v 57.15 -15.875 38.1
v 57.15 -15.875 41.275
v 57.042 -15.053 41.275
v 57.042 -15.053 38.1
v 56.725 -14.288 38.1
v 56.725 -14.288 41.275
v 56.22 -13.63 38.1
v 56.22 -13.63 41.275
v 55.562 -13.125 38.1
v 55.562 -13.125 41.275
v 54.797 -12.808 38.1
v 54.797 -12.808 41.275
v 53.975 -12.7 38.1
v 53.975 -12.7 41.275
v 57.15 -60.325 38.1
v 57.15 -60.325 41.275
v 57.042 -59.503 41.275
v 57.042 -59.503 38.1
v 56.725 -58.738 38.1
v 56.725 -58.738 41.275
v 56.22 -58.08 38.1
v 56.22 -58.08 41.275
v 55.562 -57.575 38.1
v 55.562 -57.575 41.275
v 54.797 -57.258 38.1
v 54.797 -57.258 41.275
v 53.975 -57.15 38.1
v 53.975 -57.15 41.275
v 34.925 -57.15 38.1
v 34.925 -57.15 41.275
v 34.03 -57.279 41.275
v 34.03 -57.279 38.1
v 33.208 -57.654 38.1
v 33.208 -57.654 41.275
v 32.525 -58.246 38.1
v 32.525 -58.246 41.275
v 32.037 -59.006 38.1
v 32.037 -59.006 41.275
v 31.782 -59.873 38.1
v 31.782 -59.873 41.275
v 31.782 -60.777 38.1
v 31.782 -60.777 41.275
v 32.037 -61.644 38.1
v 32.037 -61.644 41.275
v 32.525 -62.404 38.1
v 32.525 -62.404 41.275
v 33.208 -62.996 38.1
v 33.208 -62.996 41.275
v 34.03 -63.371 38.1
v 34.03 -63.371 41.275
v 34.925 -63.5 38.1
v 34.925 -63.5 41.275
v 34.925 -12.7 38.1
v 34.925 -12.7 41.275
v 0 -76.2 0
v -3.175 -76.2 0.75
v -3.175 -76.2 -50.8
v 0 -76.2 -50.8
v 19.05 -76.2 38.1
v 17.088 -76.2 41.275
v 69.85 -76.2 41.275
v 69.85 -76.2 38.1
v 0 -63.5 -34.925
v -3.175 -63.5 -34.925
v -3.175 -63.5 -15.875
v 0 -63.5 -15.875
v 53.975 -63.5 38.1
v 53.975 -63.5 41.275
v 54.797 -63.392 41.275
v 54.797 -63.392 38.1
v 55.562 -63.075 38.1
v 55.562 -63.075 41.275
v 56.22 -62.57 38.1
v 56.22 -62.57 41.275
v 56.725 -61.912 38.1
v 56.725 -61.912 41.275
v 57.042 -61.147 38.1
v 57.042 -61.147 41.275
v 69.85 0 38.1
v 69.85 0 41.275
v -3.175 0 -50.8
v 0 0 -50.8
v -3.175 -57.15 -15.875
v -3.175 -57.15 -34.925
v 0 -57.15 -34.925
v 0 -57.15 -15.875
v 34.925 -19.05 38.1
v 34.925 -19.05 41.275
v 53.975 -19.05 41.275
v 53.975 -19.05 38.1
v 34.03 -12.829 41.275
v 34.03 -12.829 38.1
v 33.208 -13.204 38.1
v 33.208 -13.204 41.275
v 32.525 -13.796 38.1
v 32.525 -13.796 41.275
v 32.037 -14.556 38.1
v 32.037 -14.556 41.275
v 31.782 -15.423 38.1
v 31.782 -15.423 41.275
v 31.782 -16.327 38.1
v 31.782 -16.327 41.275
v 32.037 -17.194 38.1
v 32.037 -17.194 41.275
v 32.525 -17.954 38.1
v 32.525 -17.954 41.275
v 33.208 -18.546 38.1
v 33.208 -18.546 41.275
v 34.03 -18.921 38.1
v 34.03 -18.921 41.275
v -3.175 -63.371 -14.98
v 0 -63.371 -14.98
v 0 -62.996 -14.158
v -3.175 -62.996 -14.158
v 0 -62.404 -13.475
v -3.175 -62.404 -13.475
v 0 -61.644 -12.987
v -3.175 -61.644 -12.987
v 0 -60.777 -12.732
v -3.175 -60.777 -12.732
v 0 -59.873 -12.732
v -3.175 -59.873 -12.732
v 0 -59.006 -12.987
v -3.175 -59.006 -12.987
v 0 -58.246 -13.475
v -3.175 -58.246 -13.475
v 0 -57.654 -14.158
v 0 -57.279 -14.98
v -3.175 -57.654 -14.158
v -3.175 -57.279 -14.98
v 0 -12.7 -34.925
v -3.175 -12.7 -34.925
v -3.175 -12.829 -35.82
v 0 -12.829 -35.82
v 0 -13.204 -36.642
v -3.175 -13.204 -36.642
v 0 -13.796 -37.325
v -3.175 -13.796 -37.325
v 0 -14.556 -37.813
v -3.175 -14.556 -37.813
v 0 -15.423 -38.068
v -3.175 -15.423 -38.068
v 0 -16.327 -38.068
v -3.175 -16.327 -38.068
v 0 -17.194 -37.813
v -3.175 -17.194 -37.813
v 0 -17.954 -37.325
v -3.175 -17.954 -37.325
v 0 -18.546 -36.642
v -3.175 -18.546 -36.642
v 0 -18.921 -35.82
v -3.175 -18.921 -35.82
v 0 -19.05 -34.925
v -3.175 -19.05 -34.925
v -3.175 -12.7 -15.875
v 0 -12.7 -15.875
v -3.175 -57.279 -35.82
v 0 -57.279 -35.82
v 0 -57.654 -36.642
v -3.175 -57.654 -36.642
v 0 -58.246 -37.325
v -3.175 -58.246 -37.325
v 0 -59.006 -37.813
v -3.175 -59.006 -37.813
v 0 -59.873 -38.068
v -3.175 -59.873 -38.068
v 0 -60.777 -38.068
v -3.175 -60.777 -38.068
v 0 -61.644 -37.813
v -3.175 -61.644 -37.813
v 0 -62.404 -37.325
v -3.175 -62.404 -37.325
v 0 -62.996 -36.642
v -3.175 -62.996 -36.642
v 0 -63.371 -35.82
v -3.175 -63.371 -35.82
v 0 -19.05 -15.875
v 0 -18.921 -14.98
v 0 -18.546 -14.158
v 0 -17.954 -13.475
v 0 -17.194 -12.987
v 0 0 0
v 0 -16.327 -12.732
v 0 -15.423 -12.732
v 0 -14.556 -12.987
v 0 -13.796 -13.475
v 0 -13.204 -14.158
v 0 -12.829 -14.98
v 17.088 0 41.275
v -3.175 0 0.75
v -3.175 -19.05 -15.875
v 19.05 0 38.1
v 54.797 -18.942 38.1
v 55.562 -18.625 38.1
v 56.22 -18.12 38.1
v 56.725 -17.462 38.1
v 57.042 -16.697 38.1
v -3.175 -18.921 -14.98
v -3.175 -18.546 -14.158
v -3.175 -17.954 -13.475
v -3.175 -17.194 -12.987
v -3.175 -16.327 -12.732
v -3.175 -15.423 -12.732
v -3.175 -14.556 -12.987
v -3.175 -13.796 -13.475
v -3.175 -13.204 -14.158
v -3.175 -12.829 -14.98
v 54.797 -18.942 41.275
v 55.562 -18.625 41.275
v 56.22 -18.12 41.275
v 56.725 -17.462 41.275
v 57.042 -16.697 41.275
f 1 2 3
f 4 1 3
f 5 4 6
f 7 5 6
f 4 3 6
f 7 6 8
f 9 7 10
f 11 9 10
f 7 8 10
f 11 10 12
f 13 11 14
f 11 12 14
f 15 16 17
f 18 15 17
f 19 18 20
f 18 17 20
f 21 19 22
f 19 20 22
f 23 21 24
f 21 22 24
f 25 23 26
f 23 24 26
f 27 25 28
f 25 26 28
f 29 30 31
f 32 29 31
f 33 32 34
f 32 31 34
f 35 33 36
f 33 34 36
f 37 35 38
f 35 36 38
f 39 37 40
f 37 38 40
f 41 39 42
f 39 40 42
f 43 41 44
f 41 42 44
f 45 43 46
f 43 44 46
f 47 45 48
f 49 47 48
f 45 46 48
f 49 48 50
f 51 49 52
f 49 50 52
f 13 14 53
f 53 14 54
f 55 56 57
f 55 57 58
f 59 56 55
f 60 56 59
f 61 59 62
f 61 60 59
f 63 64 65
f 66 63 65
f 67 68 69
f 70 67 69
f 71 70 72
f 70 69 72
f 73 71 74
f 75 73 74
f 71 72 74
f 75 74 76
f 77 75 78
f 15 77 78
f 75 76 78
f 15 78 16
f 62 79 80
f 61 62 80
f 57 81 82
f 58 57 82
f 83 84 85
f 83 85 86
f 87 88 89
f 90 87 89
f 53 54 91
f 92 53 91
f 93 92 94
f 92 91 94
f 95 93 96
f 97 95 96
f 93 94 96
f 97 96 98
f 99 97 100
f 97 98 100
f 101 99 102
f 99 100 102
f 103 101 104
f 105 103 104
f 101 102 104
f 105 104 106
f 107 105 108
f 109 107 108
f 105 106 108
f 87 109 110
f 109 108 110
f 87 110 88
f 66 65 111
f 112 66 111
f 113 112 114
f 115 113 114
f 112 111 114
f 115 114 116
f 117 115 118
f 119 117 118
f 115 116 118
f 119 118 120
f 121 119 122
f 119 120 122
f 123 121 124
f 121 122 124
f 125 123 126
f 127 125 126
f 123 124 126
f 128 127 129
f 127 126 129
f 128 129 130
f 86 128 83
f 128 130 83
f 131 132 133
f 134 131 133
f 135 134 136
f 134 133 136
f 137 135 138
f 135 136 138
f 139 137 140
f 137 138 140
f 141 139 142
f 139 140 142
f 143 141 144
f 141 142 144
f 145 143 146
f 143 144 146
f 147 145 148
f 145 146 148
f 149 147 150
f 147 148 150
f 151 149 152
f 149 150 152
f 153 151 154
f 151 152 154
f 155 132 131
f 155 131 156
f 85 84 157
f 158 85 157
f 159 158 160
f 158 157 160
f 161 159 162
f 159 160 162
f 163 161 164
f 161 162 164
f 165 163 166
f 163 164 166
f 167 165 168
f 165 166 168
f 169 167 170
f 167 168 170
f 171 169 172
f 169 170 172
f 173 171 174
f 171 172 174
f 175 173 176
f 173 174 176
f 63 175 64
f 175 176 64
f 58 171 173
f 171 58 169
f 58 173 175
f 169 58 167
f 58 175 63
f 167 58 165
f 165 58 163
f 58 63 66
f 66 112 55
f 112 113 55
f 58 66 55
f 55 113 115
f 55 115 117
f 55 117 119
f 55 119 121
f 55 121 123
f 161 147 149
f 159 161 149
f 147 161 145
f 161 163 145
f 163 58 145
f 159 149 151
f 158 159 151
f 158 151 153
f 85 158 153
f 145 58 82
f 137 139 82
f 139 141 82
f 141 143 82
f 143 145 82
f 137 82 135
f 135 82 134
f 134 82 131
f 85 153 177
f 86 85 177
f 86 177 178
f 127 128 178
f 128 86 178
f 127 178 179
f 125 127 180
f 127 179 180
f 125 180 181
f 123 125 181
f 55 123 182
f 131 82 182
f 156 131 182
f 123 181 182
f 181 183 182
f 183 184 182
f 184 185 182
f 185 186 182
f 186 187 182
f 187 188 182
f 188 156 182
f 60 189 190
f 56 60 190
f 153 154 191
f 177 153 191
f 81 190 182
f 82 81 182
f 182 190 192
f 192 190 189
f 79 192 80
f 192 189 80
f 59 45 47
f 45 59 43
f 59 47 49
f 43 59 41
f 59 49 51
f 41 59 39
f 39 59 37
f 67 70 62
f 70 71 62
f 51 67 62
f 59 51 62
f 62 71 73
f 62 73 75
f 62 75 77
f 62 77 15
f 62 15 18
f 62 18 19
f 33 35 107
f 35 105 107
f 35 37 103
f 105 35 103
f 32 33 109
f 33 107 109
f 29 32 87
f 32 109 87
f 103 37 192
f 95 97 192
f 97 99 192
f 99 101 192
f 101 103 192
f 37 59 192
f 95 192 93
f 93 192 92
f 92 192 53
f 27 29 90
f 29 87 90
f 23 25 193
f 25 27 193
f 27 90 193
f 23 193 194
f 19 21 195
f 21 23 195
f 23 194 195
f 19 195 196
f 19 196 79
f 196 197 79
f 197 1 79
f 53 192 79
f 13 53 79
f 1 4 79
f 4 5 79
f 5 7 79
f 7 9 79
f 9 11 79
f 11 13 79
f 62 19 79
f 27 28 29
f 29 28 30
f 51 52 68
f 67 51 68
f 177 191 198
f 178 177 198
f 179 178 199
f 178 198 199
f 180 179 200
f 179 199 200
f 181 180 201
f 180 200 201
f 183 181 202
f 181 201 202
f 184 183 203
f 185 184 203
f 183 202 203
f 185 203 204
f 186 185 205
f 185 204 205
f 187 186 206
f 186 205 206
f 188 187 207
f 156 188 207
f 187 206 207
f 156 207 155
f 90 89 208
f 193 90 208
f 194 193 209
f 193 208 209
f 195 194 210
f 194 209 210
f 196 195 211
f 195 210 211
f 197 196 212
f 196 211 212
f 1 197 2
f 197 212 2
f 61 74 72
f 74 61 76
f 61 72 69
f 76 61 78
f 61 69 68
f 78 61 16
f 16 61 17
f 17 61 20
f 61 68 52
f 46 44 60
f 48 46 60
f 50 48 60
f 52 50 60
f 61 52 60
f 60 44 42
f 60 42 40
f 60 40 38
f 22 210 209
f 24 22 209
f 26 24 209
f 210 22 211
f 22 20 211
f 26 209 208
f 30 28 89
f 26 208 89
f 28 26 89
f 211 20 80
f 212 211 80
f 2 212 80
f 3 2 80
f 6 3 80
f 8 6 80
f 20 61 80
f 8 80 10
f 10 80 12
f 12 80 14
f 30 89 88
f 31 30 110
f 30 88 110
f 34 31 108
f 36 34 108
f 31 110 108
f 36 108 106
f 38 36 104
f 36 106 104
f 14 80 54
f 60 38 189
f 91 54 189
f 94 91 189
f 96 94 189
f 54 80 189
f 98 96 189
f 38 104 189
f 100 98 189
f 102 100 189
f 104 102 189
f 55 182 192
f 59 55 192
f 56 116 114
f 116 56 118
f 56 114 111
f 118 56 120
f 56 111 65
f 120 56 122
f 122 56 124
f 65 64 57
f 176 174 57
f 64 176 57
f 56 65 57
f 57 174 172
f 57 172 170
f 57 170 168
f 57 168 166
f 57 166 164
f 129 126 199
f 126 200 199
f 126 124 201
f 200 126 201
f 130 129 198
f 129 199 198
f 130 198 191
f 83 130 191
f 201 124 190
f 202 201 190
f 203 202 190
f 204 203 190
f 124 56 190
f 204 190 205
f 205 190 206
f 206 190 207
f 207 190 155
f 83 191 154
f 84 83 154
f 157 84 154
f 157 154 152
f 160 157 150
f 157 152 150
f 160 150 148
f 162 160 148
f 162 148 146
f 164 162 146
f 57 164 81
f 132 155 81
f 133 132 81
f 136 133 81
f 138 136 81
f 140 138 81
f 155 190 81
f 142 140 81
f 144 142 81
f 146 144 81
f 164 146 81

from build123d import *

# Parameters (mm, degrees)
F1_DEPTH = 76.2
F3_DEPTH = 92.076
F4_DEPTH = 92.076
F5_W     = 6.35
F5_H     = 19.05
F6_DEPTH = 73.026
F7_W     = 6.35
F7_H     = 19.05
F8_DEPTH = 73.026


with BuildPart() as f1:
    # F0 (on Front) → F1 (new body)
    with BuildSketch(Plane.XZ):
        Polygon((0, -50.8), (0, 0), (19.05, 38.1), (69.85, 38.1), (69.85, 41.275), (17.087742, 41.275), (-3.175, 0.749516), (-3.175, -50.8), align=None)
    extrude(amount=F1_DEPTH)

    # F2 (on face) → F3 (cut, through all)
    with BuildSketch(Plane.XY.offset(41.275)):
        with BuildLine():
            ThreePointArc((53.975, -19.05), (56.220064, -18.120064), (57.15, -15.875))
            ThreePointArc((57.15, -15.875), (56.220064, -13.629936), (53.975, -12.7))
            ThreePointArc((53.975, -12.7), (50.8, -15.875), (53.975, -19.05))
        make_face()
        with BuildLine():
            ThreePointArc((53.975, -19.05), (50.8, -15.875), (53.975, -12.7))
            Line((53.975, -12.7), (34.925, -12.7))
            ThreePointArc((34.925, -12.7), (37.170064, -13.629936), (38.1, -15.875))
            ThreePointArc((38.1, -15.875), (37.170064, -18.120064), (34.925, -19.05))
            Line((34.925, -19.05), (53.975, -19.05))
        make_face()
        with BuildLine():
            ThreePointArc((38.1, -15.875), (37.170064, -13.629936), (34.925, -12.7))
            ThreePointArc((34.925, -12.7), (31.75, -15.875), (34.925, -19.05))
            ThreePointArc((34.925, -19.05), (37.170064, -18.120064), (38.1, -15.875))
        make_face()
    extrude(amount=-F3_DEPTH, mode=Mode.SUBTRACT)

    # F2 (on face) → F4 (cut, through all)
    with BuildSketch(Plane.XY.offset(41.275)):
        with BuildLine():
            ThreePointArc((38.1, -60.325), (37.170064, -58.079936), (34.925, -57.15))
            ThreePointArc((34.925, -57.15), (31.75, -60.325), (34.925, -63.5))
            ThreePointArc((34.925, -63.5), (37.170064, -62.570064), (38.1, -60.325))
        make_face()
        with BuildLine():
            ThreePointArc((53.975, -63.5), (56.220064, -62.570064), (57.15, -60.325))
            ThreePointArc((57.15, -60.325), (56.220064, -58.079936), (53.975, -57.15))
            ThreePointArc((53.975, -57.15), (50.8, -60.325), (53.975, -63.5))
        make_face()
        with BuildLine():
            ThreePointArc((53.975, -63.5), (50.8, -60.325), (53.975, -57.15))
            Line((53.975, -57.15), (34.925, -57.15))
            ThreePointArc((34.925, -57.15), (37.170064, -58.079936), (38.1, -60.325))
            ThreePointArc((38.1, -60.325), (37.170064, -62.570064), (34.925, -63.5))
            Line((34.925, -63.5), (53.975, -63.5))
        make_face()
    extrude(amount=-F4_DEPTH, mode=Mode.SUBTRACT)

    # F5 (on face) → F6 (cut, through all)
    with BuildSketch(Plane(origin=(-3.175, 0, 0), x_dir=(0, -1, 0), z_dir=(-1, 0, 0))):
        with BuildLine():
            Line((19.05, -34.925), (12.7, -34.925))
            ThreePointArc((12.7, -34.925), (15.875, -38.1), (19.05, -34.925))
        make_face()
        with BuildLine():
            ThreePointArc((19.05, -15.875), (15.875, -12.7), (12.7, -15.875))
            Line((12.7, -15.875), (19.05, -15.875))
        make_face()
        with Locations((15.875, -25.4)):
            Rectangle(F5_W, F5_H)
    extrude(amount=-F6_DEPTH, mode=Mode.SUBTRACT)

    # F7 (on face) → F8 (cut, through all)
    with BuildSketch(Plane(origin=(-3.175, 0, 0), x_dir=(0, -1, 0), z_dir=(-1, 0, 0))):
        with BuildLine():
            Line((57.15, -15.875), (63.5, -15.875))
            ThreePointArc((63.5, -15.875), (60.325, -12.7), (57.15, -15.875))
        make_face()
        with BuildLine():
            ThreePointArc((57.15, -34.925), (60.325, -38.1), (63.5, -34.925))
            Line((63.5, -34.925), (57.15, -34.925))
        make_face()
        with Locations((60.325, -25.4)):
            Rectangle(F7_W, F7_H)
    extrude(amount=-F8_DEPTH, mode=Mode.SUBTRACT)


solid = f1.part
